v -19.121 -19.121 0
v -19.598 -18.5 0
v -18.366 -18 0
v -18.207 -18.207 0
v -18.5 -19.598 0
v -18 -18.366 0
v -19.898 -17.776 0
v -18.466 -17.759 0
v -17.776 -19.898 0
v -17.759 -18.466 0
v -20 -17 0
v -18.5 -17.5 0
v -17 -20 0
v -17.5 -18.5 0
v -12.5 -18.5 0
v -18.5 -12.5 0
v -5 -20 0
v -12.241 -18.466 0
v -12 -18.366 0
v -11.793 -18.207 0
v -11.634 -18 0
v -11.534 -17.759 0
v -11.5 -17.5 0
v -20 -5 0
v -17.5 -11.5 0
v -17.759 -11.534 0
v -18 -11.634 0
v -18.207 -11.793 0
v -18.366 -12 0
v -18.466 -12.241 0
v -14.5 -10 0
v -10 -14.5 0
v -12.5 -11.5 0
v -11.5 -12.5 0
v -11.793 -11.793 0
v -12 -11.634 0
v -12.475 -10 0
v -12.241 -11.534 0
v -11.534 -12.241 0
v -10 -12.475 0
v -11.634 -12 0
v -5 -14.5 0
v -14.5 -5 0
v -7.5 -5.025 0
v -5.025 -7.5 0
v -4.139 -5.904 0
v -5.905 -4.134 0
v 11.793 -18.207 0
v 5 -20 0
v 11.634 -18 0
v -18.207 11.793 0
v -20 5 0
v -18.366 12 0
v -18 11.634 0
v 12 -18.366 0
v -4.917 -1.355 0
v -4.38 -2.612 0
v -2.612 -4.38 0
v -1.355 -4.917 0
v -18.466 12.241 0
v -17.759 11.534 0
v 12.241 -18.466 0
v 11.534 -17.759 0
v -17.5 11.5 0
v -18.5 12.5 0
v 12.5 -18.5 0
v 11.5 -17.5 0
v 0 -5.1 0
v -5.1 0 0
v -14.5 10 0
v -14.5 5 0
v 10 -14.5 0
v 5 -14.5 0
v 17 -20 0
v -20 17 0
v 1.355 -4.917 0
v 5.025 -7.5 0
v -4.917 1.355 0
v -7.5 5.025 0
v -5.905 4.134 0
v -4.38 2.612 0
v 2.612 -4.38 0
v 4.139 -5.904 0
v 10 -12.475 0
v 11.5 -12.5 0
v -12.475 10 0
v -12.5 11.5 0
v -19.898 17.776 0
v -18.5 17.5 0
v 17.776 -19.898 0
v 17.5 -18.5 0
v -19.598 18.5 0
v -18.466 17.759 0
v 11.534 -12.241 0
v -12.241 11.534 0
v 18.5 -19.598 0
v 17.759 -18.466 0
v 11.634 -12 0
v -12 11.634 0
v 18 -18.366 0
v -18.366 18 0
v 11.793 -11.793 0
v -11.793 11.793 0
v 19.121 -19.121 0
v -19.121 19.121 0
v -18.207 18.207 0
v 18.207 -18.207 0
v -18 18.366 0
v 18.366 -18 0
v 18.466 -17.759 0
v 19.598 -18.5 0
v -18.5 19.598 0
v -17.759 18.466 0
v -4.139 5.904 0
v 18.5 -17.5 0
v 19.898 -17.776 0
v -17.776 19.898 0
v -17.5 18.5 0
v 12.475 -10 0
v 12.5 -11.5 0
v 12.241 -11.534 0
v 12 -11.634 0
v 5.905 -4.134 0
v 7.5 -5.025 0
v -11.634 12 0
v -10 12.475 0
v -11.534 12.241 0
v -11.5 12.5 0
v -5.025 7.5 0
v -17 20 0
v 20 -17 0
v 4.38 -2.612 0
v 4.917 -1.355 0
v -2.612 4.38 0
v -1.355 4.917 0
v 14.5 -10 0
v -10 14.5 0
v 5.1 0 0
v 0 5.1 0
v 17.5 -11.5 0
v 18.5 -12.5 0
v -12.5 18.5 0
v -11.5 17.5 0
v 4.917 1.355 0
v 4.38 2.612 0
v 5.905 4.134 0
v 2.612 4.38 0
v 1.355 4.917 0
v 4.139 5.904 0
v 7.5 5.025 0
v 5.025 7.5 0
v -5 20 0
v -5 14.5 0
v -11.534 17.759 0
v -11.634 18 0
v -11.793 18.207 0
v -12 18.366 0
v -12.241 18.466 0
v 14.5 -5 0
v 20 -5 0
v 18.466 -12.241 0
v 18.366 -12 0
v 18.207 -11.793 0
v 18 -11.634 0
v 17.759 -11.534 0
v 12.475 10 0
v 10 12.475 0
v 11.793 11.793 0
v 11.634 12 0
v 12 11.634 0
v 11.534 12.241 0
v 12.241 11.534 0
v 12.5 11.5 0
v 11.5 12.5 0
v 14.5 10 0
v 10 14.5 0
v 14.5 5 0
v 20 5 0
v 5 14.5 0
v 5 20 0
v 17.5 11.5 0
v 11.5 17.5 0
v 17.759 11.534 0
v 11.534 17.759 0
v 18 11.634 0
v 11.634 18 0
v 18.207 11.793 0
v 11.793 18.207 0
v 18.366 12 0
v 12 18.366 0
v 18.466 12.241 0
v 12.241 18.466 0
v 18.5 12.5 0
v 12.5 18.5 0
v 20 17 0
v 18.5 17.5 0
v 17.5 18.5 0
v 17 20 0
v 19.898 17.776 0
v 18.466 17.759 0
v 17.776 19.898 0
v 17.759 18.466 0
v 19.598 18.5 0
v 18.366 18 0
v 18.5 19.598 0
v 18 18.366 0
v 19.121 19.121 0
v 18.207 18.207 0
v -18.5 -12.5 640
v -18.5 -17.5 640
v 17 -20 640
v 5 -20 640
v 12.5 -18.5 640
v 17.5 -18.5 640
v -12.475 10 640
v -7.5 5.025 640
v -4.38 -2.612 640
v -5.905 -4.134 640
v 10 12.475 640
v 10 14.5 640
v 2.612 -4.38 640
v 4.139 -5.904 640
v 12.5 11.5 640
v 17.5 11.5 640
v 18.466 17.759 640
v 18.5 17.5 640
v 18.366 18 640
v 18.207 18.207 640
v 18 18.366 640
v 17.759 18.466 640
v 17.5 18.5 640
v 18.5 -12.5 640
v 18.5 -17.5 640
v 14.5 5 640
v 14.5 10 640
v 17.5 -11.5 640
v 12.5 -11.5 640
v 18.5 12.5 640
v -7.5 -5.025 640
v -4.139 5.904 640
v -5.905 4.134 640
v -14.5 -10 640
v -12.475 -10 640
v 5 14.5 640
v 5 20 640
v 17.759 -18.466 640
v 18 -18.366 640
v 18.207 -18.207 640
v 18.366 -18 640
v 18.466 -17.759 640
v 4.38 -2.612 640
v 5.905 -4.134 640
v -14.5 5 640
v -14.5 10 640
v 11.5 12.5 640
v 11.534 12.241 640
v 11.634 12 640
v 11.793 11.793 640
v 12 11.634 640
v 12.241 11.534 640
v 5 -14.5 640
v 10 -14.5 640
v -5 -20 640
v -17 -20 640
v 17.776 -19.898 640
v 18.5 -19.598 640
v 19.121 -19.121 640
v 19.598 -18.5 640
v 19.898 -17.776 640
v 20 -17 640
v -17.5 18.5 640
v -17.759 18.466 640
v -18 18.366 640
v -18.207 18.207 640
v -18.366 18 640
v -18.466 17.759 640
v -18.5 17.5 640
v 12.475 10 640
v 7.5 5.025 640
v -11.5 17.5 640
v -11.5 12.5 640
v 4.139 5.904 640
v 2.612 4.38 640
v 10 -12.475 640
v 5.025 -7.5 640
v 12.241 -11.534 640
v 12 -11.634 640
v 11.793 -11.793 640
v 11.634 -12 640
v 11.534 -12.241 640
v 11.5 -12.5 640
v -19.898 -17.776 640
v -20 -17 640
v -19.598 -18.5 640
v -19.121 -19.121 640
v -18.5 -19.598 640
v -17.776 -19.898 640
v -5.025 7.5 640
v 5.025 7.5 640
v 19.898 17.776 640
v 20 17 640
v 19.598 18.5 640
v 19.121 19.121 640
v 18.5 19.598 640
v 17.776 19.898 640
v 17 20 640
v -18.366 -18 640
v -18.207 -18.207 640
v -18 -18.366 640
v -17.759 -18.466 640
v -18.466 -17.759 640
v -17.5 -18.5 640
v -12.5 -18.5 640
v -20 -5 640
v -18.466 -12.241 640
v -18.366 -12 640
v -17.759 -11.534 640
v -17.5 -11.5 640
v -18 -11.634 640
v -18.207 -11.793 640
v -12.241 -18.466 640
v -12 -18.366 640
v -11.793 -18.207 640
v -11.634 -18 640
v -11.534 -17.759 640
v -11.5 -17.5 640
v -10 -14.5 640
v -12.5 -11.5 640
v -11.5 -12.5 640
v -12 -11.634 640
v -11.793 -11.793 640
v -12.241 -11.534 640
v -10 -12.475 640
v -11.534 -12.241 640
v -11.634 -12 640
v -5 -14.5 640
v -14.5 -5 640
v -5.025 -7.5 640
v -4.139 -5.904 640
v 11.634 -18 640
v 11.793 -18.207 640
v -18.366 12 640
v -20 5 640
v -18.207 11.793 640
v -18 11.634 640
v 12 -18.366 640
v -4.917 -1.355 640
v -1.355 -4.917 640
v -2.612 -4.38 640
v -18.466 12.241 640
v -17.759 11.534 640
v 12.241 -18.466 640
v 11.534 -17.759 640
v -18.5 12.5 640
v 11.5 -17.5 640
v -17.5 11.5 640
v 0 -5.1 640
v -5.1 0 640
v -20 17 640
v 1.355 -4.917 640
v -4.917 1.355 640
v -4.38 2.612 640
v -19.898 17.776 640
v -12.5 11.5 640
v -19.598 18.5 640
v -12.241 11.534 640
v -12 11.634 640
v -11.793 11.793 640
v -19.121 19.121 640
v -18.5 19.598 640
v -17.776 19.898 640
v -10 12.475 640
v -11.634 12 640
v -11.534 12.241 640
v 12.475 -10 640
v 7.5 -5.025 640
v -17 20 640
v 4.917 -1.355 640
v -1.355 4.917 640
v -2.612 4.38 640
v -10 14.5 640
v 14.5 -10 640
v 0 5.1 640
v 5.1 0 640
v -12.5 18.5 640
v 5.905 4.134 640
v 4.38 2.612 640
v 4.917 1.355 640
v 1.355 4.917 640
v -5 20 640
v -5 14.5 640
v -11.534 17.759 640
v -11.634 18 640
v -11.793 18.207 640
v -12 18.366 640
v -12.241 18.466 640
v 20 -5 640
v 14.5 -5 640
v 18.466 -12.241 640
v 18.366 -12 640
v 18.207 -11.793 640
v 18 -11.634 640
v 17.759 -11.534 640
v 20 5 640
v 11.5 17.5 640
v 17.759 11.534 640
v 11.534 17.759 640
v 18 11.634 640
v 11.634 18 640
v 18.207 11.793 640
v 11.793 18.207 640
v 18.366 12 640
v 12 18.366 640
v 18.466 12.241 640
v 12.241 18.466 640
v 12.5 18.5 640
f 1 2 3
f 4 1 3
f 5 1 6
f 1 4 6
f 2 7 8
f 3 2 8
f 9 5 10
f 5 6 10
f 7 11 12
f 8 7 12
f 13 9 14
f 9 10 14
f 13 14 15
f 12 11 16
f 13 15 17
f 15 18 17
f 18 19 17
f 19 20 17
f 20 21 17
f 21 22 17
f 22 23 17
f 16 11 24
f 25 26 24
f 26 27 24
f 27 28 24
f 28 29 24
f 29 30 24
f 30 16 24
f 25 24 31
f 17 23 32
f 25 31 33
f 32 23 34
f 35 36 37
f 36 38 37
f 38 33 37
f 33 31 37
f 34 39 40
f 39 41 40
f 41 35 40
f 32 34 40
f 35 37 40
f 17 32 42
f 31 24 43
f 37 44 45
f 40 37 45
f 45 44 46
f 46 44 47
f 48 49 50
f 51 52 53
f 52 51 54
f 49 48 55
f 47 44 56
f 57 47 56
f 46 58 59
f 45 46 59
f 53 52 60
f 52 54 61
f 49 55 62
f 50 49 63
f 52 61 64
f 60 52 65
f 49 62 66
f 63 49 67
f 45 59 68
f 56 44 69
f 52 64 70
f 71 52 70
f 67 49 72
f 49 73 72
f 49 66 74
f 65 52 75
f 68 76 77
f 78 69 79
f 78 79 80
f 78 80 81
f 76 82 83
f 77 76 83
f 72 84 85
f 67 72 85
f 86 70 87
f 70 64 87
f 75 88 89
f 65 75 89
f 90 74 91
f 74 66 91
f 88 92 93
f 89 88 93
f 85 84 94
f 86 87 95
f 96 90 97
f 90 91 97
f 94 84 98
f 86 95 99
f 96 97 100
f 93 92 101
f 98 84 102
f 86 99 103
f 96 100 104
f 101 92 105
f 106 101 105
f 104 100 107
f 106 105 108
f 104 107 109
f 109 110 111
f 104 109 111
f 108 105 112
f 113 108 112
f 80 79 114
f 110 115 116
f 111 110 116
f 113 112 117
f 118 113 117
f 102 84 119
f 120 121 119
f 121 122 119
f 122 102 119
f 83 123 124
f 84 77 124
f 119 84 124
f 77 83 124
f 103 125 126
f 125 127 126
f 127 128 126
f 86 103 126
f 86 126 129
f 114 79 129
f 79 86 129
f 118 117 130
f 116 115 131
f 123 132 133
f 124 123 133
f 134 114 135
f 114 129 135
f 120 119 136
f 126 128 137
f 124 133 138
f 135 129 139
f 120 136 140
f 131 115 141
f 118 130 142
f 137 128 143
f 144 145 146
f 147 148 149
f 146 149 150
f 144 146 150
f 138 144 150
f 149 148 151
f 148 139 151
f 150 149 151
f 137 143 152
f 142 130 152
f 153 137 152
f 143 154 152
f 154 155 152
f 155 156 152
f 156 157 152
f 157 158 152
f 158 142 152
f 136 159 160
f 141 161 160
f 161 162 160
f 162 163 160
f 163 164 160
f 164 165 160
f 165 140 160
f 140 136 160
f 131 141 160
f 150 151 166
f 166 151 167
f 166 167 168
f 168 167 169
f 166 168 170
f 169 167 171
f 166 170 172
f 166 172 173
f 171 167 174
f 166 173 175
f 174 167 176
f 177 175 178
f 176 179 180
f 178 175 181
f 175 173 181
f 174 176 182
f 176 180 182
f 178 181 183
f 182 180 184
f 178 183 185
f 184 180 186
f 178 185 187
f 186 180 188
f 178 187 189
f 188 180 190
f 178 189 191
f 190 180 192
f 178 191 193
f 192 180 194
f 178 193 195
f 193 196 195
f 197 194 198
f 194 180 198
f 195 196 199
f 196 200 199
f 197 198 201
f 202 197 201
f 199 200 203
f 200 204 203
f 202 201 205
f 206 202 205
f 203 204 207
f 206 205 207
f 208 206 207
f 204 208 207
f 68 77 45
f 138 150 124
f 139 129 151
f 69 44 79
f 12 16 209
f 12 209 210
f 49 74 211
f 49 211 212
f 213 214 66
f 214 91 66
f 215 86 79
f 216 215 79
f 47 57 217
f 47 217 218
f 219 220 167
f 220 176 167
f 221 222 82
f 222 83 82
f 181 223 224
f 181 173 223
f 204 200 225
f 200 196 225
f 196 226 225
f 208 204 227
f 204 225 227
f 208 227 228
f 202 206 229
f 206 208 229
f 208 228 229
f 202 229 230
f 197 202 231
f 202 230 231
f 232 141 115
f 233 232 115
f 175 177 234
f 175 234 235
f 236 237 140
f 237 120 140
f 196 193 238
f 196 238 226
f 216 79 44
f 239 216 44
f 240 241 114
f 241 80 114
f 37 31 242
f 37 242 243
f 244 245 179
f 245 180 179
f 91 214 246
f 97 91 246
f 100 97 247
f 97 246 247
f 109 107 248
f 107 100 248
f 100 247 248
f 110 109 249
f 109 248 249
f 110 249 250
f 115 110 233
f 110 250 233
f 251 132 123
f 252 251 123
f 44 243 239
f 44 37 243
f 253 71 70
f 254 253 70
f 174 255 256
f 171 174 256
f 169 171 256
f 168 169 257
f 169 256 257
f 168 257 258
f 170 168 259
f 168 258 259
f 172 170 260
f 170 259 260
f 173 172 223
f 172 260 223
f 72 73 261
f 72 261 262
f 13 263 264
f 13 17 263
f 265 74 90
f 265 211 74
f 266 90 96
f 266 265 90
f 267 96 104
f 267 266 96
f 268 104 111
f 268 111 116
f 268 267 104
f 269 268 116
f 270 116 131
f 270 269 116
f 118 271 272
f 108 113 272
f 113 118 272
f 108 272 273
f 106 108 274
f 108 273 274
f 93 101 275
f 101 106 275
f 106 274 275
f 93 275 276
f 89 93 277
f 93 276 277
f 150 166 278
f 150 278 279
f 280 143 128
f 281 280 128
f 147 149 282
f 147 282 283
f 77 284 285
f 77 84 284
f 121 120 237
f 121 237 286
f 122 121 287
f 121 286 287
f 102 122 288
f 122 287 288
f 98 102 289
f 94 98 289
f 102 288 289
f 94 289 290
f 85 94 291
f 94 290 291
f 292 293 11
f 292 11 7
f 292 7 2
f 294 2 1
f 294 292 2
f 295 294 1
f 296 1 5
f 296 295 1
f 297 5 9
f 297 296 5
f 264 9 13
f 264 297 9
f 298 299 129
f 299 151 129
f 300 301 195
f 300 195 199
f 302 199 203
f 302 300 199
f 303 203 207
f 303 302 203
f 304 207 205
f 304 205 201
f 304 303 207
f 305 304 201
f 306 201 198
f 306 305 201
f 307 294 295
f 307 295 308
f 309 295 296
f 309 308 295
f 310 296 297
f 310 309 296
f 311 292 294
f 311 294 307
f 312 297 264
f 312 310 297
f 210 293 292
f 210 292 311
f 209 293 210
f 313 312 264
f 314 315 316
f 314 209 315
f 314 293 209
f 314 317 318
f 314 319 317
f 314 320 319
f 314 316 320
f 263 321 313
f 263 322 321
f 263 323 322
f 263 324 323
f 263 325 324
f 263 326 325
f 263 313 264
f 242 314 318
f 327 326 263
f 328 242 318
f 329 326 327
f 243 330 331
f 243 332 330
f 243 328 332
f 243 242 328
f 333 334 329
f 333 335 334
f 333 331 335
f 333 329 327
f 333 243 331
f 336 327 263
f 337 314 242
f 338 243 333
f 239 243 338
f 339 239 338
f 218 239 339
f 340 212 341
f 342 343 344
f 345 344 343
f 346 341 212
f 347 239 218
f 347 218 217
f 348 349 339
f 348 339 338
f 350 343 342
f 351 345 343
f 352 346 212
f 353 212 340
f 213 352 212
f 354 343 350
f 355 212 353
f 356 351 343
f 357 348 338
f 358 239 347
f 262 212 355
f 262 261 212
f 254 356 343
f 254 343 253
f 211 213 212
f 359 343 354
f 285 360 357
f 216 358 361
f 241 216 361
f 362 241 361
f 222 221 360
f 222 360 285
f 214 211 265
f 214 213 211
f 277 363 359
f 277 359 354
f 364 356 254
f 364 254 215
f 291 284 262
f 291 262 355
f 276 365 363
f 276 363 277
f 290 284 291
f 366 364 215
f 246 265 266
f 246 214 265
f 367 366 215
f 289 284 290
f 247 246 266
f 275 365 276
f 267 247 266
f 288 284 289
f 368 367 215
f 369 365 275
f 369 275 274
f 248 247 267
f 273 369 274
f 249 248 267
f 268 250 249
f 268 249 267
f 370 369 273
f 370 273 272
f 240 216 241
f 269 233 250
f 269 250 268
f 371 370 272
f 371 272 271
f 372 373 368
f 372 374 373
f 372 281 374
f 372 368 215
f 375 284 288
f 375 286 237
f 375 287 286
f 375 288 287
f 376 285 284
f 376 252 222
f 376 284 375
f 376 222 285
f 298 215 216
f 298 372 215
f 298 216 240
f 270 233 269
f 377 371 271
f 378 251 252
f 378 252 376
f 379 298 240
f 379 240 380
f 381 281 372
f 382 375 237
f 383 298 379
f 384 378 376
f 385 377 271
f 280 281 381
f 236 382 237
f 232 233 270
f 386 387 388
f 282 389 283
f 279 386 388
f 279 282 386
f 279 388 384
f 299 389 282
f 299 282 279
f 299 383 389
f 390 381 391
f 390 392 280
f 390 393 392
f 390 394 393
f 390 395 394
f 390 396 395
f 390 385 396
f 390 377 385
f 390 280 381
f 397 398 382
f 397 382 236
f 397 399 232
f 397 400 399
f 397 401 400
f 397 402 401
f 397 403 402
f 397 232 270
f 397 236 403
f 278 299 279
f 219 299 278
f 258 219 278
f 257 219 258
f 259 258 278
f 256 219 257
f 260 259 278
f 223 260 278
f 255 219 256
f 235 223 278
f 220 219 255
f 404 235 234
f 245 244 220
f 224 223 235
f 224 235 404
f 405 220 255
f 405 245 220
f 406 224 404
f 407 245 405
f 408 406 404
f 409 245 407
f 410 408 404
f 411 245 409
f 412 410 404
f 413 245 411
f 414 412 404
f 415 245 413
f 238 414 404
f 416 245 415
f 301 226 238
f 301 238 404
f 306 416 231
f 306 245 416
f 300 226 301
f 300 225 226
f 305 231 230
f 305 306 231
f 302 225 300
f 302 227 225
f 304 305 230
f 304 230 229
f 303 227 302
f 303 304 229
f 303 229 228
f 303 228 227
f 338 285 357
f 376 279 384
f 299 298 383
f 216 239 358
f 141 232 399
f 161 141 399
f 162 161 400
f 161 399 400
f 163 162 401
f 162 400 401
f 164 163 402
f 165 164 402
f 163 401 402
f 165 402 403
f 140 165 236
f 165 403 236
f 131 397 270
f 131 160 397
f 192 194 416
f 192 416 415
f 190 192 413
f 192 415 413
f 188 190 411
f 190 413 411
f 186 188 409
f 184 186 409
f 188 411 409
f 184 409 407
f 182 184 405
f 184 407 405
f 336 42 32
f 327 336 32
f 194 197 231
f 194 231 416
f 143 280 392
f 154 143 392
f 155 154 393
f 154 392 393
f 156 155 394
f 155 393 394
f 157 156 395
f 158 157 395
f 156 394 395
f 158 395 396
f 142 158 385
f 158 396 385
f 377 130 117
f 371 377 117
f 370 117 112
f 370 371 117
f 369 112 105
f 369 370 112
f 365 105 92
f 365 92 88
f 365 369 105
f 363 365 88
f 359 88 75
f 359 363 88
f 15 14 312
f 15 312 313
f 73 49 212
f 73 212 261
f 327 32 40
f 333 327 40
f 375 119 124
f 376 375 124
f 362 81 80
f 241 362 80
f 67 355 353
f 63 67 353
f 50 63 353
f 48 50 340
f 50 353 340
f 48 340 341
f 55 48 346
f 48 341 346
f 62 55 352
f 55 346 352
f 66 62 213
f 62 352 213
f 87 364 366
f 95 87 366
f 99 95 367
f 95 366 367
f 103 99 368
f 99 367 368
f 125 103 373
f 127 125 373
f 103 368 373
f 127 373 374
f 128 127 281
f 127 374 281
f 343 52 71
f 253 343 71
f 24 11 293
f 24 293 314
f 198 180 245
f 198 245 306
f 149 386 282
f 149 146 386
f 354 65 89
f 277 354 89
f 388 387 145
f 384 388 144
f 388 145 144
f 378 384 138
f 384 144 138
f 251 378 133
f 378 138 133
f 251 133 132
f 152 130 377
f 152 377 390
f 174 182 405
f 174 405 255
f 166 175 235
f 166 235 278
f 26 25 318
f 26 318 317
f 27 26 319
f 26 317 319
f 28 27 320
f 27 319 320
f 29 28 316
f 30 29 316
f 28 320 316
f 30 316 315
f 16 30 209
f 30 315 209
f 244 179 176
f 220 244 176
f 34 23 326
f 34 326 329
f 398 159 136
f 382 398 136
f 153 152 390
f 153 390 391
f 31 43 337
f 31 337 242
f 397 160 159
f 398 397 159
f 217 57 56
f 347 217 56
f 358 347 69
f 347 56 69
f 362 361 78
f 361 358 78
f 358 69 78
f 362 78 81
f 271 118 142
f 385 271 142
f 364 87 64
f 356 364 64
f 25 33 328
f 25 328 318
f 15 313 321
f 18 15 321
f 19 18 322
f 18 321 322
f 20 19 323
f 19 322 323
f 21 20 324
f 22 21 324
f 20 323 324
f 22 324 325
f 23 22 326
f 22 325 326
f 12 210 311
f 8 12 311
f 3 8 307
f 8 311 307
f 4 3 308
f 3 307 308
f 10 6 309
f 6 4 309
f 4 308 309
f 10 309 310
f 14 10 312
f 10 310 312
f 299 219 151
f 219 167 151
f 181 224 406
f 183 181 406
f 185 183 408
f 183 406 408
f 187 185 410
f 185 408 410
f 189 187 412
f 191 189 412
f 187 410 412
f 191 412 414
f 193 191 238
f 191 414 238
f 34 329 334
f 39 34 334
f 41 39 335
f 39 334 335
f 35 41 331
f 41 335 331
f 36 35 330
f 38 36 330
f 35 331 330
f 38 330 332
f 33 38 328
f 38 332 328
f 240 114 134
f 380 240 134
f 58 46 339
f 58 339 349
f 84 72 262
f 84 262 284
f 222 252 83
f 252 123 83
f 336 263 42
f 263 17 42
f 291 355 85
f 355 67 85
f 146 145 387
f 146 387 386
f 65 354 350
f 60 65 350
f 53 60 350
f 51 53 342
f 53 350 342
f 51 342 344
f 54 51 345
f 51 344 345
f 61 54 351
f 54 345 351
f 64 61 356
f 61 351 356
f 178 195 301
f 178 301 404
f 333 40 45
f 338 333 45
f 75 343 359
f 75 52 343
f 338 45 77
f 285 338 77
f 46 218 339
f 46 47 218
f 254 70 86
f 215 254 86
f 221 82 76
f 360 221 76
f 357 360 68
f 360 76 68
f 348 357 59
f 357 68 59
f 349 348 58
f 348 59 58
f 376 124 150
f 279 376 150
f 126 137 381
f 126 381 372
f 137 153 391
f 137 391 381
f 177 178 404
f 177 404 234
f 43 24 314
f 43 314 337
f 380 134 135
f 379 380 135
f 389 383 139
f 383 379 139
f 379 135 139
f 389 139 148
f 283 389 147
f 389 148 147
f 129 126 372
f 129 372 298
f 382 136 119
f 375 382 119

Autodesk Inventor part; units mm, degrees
ref_plane "YZ Plane" through (0, 0, 0) normal (1, 0, 0) x (0, 1, 0)
ref_plane "XZ Plane" through (0, 0, 0) normal (0, 1, 0) x (-1, 0, 0)
ref_plane "XY Plane" through (0, 0, 0) normal (0, 0, 1) x (1, 0, 0)
sketch "T-Slot 4040 Base" plane through (0, 0, 0) normal (0, 0, 1) x (1, 0, 0)
  line L0 (-28, 0) -> (28, 0) construction
  line L1 (0, -28) -> (0, 28) construction
  circle A0 centre (0, 0) radius 5.1
  line L2 (-7.5, -7.5) -> (7.5, -7.5)
  line L3 (7.5, -7.5) -> (7.5, 7.5)
  line L4 (7.5, 7.5) -> (-7.5, 7.5)
  line L5 (-7.5, 7.5) -> (-7.5, -7.5)
  line L6 (-7.5, -7.5) -> (7.5, 7.5) construction
  line L7 (7.5, -7.5) -> (-7.5, 7.5) construction
  line L8 (-20, 20) -> (20, 20)
  line L9 (20, 20) -> (20, -20)
  line L10 (20, -20) -> (-20, -20)
  line L11 (-20, -20) -> (-20, 20)
  line L12 (-20, 20) -> (20, -20) construction
  line L13 (20, 20) -> (-20, -20) construction
  line L14 (20, 5) -> (14.5, 5)
  line L15 (14.5, 5) -> (14.5, 10)
  line L16 (14.5, 10) -> (12.4749, 10)
  line L17 (12.4749, 10) -> (7.5, 5.0251)
  line L18 (5, 20) -> (5, 14.5)
  line L19 (5, 14.5) -> (10, 14.5)
  line L20 (10, 14.5) -> (10, 12.4749)
  line L21 (10, 12.4749) -> (5.0251, 7.5)
  line L22 (18.5, 18.5) -> (11.5, 18.5)
  line L23 (11.5, 18.5) -> (11.5, 11.5)
  line L24 (11.5, 11.5) -> (18.5, 11.5)
  line L25 (18.5, 11.5) -> (18.5, 18.5)
  line L26 (18.5, 18.5) -> (11.5, 11.5) construction
  line L27 (11.5, 18.5) -> (18.5, 11.5) construction
  line L28 (3.0732, 1.3088) -> (4.38, 2.6125) construction
  line L29 (5.905, 4.1338) -> (4.1393, 5.9037)
  line L30 (4.1393, 5.9037) -> (2.6122, 4.3802)
  line L31 (1.3075, 3.0787) -> (3.0732, 1.3088) construction
  line L32 (3.0732, 1.3088) -> (4.1393, 5.9037) construction
  line L33 (5.905, 4.1338) -> (1.3075, 3.0787) construction
  line L34 (4.38, 2.6125) -> (5.905, 4.1338)
  line L35 (2.6122, 4.3802) -> (1.3075, 3.0787) construction
  line L36 (-20, 5) -> (-14.5, 5)
  line L37 (-14.5, 5) -> (-14.5, 10)
  line L38 (-14.5, 10) -> (-12.4749, 10)
  line L39 (-12.4749, 10) -> (-7.5, 5.0251)
  line L40 (-5, 20) -> (-5, 14.5)
  line L41 (-5, 14.5) -> (-10, 14.5)
  line L42 (-10, 14.5) -> (-10, 12.4749)
  line L43 (-10, 12.4749) -> (-5.0251, 7.5)
  line L44 (-18.5, 18.5) -> (-11.5, 18.5)
  line L45 (-11.5, 18.5) -> (-11.5, 11.5)
  line L46 (-11.5, 11.5) -> (-18.5, 11.5)
  line L47 (-18.5, 11.5) -> (-18.5, 18.5)
  line L48 (-5.905, 4.1338) -> (-4.1393, 5.9037)
  line L49 (-4.1393, 5.9037) -> (-2.6122, 4.3802)
  line L50 (-4.38, 2.6125) -> (-5.905, 4.1338)
  line L51 (7.5, -7.5) -> (-7.5, -7.5)
  line L52 (20, -5) -> (14.5, -5)
  line L53 (14.5, -5) -> (14.5, -10)
  line L54 (14.5, -10) -> (12.4749, -10)
  line L55 (12.4749, -10) -> (7.5, -5.0251)
  line L56 (5, -20) -> (5, -14.5)
  line L57 (5, -14.5) -> (10, -14.5)
  line L58 (10, -14.5) -> (10, -12.4749)
  line L59 (10, -12.4749) -> (5.0251, -7.5)
  line L60 (18.5, -18.5) -> (11.5, -18.5)
  line L61 (11.5, -18.5) -> (11.5, -11.5)
  line L62 (11.5, -11.5) -> (18.5, -11.5)
  line L63 (18.5, -11.5) -> (18.5, -18.5)
  line L64 (18.5, -18.5) -> (11.5, -11.5) construction
  line L65 (11.5, -18.5) -> (18.5, -11.5) construction
  line L66 (3.0732, -1.3088) -> (4.38, -2.6125) construction
  line L67 (5.905, -4.1338) -> (4.1393, -5.9037)
  line L68 (4.1393, -5.9037) -> (2.6122, -4.3802)
  line L69 (1.3075, -3.0787) -> (3.0732, -1.3088) construction
  line L70 (3.0732, -1.3088) -> (4.1393, -5.9037) construction
  line L71 (5.905, -4.1338) -> (1.3075, -3.0787) construction
  line L72 (4.38, -2.6125) -> (5.905, -4.1338)
  line L73 (2.6122, -4.3802) -> (1.3075, -3.0787) construction
  line L74 (-4.38, -2.6125) -> (-5.905, -4.1338)
  line L75 (-4.1393, -5.9037) -> (-2.6122, -4.3802)
  line L76 (-5.905, -4.1338) -> (-4.1393, -5.9037)
  line L77 (-12.4749, -10) -> (-7.5, -5.0251)
  line L78 (-10, -12.4749) -> (-5.0251, -7.5)
  line L79 (-10, -14.5) -> (-10, -12.4749)
  line L80 (-5, -14.5) -> (-10, -14.5)
  line L81 (-5, -20) -> (-5, -14.5)
  line L82 (-18.5, -18.5) -> (-11.5, -18.5)
  line L83 (-11.5, -18.5) -> (-11.5, -11.5)
  line L84 (-11.5, -11.5) -> (-18.5, -11.5)
  line L85 (-18.5, -11.5) -> (-18.5, -18.5)
  line L86 (-14.5, -10) -> (-12.4749, -10)
  line L87 (-14.5, -5) -> (-14.5, -10)
  line L88 (-20, -5) -> (-14.5, -5)
  point P0 (15, 15)
  point P1 (3.6062, 3.6062)
  point P2 (3.6062, 3.6062)
  point P3 (15, -15)
  point P4 (3.6062, -3.6062)
  point P5 (3.6062, -3.6062)
  dimension "d9" = 10.2
  dimension "d12" = 40
  dimension "d13" = 40
  dimension "d14" = 5.5
  dimension "d15" = 15
  dimension "d16" = 7
  dimension "d17" = 10
  dimension "d20" = 1.75
  dimension "d21" = 7
  dimension "d22" = 2
  dimension "d29" = 1.5
  dimension "d30" = 2.5
extrude "Extrusion1" add sketch "T-Slot 4040 Base" along normal blind 640 contours L5 L4 L3 L2 | L2 L78 L79 L80 L81 L10 L11 L88 L87 L86 L77 L5 | L2 L3 L55 L54 L53 L52 L9 L10 L56 L57 L58 L59 | L39 L38 L37 L36 L11 L8 L40 L41 L42 L43 L4 L5 | L3 L4 L21 L20 L19 L18 L8 L9 L14 L15 L16 L17
fillet "Rundung1" radius 1 16 edges at (11.5, 18.5, 320) (18.5, 18.5, 320) (18.5, 11.5, 320) (11.5, 11.5, 320) (-11.5, 18.5, 320) (-18.5, 18.5, 320) (-18.5, 11.5, 320) (-11.5, 11.5, 320) (-18.5, -11.5, 320) (-11.5, -11.5, 320) (-11.5, -18.5, 320) (-18.5, -18.5, 320) (11.5, -18.5, 320) (11.5, -11.5, 320) (18.5, -11.5, 320) (18.5, -18.5, 320)
fillet "Rundung2" radius 3 4 edges at (20, 20, 320) (20, -20, 320) (-20, -20, 320) (-20, 20, 320)
properties part number "T-SLOT 4040 B-Type 640mm"
